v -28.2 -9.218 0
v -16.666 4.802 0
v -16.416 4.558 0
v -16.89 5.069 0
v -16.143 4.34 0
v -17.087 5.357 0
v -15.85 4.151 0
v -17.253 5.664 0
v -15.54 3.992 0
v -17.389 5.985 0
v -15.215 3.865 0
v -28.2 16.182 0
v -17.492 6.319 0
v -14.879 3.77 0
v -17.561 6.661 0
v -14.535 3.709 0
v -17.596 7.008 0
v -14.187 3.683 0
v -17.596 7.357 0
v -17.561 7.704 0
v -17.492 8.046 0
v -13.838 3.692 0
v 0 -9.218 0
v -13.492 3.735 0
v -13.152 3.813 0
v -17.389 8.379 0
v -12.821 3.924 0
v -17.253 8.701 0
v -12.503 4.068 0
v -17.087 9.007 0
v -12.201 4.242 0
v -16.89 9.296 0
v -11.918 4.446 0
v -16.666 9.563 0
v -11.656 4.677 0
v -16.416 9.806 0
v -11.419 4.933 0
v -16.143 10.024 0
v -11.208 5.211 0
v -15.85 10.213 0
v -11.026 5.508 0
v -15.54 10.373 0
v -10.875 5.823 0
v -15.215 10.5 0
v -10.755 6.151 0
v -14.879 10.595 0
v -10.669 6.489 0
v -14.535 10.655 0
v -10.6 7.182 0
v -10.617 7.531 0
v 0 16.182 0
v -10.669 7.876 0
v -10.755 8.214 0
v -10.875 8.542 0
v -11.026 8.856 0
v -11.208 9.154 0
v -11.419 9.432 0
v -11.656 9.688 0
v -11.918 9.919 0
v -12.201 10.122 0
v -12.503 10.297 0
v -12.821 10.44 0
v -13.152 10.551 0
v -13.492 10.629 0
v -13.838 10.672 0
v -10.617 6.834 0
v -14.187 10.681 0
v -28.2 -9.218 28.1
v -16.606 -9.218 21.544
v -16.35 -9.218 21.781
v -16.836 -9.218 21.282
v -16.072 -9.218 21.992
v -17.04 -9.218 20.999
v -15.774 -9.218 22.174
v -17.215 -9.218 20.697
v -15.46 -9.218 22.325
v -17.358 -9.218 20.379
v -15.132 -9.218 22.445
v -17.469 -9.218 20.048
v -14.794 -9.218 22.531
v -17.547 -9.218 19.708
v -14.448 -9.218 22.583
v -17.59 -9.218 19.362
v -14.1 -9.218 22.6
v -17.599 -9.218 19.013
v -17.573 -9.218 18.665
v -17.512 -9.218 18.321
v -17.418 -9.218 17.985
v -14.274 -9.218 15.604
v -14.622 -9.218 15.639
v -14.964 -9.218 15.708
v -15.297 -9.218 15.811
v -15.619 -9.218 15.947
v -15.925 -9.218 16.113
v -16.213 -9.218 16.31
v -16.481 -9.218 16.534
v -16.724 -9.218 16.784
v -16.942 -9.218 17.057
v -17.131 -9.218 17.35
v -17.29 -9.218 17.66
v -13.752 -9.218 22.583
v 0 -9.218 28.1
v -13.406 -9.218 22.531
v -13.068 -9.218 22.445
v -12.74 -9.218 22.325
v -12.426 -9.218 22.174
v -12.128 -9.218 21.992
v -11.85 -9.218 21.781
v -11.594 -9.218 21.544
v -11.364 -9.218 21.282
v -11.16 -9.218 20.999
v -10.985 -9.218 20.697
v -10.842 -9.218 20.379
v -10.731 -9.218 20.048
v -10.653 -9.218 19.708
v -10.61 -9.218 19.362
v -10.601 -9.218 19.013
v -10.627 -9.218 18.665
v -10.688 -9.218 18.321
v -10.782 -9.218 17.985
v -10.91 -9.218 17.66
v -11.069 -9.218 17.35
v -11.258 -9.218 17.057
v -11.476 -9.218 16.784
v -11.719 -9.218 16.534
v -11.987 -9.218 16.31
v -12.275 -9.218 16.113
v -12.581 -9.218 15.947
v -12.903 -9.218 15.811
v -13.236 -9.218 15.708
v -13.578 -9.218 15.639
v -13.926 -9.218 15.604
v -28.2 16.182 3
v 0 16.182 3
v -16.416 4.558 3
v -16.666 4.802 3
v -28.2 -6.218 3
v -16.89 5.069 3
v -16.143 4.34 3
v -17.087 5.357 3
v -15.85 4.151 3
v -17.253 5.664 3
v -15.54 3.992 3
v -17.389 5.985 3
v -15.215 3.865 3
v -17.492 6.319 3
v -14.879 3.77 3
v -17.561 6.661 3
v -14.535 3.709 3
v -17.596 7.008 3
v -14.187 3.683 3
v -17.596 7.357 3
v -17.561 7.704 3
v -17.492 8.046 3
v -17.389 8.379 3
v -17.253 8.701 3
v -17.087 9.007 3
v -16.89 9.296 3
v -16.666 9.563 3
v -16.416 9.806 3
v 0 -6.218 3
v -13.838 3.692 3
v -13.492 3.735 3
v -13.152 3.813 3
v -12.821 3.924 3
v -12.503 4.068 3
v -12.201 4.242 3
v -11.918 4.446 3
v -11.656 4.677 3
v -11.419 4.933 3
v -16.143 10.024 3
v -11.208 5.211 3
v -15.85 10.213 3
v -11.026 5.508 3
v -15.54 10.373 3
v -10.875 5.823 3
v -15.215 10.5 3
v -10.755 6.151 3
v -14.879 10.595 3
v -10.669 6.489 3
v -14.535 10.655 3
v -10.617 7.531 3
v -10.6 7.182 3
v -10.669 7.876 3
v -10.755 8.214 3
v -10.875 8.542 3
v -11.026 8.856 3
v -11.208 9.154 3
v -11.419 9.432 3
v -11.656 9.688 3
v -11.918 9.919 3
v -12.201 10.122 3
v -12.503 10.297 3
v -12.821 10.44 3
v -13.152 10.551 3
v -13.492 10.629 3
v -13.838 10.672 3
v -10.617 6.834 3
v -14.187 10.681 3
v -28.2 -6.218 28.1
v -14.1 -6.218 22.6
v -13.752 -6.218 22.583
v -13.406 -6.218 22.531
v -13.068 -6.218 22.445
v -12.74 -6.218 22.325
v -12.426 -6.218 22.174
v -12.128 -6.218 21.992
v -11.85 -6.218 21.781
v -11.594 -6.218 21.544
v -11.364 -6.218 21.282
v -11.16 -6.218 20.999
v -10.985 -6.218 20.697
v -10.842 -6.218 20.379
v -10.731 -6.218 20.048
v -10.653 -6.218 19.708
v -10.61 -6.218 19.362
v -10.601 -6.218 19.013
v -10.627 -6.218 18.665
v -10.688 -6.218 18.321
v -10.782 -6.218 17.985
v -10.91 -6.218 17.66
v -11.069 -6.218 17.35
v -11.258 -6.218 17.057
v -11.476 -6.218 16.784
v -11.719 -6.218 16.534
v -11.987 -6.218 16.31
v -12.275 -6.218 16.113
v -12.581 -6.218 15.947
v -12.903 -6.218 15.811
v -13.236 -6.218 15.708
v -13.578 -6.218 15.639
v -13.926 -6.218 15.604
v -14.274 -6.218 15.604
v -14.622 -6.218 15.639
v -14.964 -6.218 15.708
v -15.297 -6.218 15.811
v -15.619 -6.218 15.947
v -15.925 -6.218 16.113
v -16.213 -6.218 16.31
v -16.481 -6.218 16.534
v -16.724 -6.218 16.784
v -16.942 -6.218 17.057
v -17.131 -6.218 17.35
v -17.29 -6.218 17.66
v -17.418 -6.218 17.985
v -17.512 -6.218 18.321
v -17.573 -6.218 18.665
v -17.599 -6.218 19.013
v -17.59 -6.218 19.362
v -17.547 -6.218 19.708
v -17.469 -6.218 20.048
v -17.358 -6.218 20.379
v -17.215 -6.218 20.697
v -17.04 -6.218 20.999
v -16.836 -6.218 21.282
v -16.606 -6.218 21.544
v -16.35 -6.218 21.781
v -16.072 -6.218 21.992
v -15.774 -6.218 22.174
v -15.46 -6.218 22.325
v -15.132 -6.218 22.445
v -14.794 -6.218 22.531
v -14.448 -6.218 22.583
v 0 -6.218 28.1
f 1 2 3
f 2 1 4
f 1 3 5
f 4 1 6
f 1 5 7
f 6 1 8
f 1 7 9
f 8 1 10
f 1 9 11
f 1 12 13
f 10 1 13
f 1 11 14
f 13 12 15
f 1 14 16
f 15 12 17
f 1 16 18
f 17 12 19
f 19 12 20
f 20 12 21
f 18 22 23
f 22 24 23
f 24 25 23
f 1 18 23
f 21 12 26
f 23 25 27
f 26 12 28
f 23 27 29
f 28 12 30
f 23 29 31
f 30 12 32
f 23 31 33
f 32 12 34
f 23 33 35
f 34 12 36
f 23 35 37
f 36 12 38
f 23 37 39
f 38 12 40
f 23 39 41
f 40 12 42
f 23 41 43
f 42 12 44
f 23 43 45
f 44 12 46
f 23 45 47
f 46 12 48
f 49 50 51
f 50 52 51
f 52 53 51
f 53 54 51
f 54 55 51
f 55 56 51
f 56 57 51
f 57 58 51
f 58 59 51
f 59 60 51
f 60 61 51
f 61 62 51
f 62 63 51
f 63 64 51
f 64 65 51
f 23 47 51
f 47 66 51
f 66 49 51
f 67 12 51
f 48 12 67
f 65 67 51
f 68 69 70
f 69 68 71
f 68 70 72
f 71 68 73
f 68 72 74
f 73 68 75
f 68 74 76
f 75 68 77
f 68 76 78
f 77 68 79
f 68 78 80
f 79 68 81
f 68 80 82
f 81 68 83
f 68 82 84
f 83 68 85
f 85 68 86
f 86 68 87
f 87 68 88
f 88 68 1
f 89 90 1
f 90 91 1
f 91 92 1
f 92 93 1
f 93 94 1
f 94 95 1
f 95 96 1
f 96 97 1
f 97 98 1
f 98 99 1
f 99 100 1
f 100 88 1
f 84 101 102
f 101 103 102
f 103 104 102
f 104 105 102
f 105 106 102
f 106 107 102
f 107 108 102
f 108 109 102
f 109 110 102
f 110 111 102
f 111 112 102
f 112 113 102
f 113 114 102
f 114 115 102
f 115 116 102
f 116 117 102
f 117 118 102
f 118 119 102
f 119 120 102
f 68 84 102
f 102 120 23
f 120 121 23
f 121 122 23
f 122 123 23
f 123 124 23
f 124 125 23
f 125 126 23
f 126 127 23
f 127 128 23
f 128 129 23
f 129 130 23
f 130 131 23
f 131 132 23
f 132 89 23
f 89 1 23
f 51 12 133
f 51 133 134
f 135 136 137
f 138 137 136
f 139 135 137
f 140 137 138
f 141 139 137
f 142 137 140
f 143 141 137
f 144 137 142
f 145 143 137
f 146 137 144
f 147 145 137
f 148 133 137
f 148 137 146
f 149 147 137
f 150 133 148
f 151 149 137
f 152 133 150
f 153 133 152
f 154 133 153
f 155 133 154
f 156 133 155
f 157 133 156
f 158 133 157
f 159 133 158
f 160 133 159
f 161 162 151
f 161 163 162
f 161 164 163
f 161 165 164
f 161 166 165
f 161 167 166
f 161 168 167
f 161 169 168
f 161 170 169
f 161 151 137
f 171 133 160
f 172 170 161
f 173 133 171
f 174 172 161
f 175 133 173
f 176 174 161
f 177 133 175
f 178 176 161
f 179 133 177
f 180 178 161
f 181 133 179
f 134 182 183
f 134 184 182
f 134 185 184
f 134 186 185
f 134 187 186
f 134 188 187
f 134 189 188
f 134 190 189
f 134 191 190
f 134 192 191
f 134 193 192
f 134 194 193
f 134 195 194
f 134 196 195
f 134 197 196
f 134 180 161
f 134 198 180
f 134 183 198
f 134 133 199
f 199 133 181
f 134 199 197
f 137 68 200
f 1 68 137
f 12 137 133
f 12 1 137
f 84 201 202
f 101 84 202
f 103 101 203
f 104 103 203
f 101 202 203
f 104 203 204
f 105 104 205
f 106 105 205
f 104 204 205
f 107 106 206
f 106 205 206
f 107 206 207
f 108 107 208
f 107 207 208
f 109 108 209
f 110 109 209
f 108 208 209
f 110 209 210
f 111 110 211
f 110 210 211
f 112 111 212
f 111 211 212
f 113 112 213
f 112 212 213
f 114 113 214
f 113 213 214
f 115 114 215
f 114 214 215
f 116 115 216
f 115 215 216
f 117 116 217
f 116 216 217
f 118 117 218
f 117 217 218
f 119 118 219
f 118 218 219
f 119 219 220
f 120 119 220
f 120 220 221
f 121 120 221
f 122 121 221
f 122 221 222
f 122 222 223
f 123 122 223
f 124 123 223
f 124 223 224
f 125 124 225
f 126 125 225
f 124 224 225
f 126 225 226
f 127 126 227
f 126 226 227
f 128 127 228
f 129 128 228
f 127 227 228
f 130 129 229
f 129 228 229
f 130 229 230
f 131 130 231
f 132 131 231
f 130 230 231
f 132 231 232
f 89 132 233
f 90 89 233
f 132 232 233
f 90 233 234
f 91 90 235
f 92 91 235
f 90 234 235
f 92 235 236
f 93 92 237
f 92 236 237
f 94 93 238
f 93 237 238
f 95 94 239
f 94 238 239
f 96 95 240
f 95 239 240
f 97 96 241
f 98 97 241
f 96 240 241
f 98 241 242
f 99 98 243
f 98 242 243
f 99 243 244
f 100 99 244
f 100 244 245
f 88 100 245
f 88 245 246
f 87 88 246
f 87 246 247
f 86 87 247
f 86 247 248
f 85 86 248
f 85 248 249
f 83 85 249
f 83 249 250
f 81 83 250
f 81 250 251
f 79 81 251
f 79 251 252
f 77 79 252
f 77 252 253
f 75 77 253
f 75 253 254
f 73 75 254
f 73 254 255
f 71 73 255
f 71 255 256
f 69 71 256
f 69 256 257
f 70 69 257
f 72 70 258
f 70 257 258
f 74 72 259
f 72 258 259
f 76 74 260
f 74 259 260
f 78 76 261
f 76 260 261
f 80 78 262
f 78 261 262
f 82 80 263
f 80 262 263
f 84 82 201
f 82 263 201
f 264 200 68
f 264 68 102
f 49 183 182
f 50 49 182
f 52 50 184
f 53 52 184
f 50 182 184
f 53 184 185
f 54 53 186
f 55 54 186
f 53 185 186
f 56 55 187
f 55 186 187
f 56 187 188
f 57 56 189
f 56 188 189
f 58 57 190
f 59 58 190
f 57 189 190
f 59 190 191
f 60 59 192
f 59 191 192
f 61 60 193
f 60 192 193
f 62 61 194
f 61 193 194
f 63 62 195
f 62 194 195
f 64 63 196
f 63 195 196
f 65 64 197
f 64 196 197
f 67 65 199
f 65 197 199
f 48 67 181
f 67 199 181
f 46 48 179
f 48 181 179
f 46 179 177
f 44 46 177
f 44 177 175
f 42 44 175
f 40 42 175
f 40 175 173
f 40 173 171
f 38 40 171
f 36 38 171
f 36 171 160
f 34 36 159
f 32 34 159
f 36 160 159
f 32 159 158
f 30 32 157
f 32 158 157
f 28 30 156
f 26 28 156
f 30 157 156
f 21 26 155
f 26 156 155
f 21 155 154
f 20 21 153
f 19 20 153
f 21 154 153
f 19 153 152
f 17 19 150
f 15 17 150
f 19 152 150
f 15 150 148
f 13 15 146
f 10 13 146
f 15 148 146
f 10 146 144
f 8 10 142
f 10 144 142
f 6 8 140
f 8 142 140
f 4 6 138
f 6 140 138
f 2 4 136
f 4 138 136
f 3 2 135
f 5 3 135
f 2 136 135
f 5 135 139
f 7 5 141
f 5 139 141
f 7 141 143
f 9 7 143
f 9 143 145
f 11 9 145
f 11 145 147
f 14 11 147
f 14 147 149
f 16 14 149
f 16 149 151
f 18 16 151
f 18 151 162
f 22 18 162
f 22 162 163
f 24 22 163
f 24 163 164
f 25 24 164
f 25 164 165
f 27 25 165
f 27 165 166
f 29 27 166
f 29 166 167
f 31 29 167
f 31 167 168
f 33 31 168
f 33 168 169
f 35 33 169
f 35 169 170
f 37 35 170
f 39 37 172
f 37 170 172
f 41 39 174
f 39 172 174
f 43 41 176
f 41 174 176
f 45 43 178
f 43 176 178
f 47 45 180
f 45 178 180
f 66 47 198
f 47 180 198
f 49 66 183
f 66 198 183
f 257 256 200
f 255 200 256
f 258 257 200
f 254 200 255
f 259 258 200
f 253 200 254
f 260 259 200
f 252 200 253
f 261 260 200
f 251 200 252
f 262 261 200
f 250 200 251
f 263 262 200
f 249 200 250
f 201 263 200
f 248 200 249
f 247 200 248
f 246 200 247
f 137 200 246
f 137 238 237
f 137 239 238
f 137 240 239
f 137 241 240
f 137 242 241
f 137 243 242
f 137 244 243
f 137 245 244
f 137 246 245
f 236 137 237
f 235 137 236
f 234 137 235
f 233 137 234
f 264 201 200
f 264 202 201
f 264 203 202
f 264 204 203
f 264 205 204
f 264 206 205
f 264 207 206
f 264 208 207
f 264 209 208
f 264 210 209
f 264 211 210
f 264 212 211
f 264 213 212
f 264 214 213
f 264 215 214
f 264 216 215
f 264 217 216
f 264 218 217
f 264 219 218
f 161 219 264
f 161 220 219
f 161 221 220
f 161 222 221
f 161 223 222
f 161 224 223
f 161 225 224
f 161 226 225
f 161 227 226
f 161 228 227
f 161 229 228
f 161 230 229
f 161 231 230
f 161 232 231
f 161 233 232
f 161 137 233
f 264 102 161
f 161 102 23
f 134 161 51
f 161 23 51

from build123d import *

# Parameters (mm, degrees)
ESBO_O1_W                = 28.2
ESBO_O1_H                = 25.4
RESSALTO_EXTRUS_O1_DEPTH = 3
ESBO_O2_W                = 28.2
ESBO_O2_H                = 3
RESSALTO_EXTRUS_O2_DEPTH = 25.1
ESBO_O3_R                = 3.5
CORTE_EXTRUS_O1_DEPTH    = 3
ESBO_O4_R                = 3.5
CORTE_EXTRUS_O2_DEPTH    = 3


with BuildPart() as part:
    # Esboço1 → Ressalto-extrusão1 (new body)
    with BuildSketch(Plane.XY):
        with Locations((-14.1, 3.482258065)):
            Rectangle(ESBO_O1_W, ESBO_O1_H)
    extrude(amount=RESSALTO_EXTRUS_O1_DEPTH)

    # Esboço2 → Ressalto-extrusão2 (add)
    with BuildSketch(Plane.XY.offset(3)):
        with Locations((-14.1, -7.717741935)):
            Rectangle(ESBO_O2_W, ESBO_O2_H)
    extrude(amount=RESSALTO_EXTRUS_O2_DEPTH)

    # Esboço3 → Corte-extrusão1 (cut)
    with BuildSketch(Plane(origin=(0, -6.217741935, 0), x_dir=(1, 0, 0), z_dir=(0, 1, 0))):
        with Locations(Location((-14.1, -19.1, 0), (0, 0, 270))):
            Circle(ESBO_O3_R)
    extrude(amount=-CORTE_EXTRUS_O1_DEPTH, mode=Mode.SUBTRACT)

    # Esboço4 → Corte-extrusão2 (cut)
    with BuildSketch(Plane.XY.offset(3)):
        with Locations((-14.1, 7.182258065)):
            Circle(ESBO_O4_R)
    extrude(amount=-CORTE_EXTRUS_O2_DEPTH, mode=Mode.SUBTRACT)


solid = part.part
